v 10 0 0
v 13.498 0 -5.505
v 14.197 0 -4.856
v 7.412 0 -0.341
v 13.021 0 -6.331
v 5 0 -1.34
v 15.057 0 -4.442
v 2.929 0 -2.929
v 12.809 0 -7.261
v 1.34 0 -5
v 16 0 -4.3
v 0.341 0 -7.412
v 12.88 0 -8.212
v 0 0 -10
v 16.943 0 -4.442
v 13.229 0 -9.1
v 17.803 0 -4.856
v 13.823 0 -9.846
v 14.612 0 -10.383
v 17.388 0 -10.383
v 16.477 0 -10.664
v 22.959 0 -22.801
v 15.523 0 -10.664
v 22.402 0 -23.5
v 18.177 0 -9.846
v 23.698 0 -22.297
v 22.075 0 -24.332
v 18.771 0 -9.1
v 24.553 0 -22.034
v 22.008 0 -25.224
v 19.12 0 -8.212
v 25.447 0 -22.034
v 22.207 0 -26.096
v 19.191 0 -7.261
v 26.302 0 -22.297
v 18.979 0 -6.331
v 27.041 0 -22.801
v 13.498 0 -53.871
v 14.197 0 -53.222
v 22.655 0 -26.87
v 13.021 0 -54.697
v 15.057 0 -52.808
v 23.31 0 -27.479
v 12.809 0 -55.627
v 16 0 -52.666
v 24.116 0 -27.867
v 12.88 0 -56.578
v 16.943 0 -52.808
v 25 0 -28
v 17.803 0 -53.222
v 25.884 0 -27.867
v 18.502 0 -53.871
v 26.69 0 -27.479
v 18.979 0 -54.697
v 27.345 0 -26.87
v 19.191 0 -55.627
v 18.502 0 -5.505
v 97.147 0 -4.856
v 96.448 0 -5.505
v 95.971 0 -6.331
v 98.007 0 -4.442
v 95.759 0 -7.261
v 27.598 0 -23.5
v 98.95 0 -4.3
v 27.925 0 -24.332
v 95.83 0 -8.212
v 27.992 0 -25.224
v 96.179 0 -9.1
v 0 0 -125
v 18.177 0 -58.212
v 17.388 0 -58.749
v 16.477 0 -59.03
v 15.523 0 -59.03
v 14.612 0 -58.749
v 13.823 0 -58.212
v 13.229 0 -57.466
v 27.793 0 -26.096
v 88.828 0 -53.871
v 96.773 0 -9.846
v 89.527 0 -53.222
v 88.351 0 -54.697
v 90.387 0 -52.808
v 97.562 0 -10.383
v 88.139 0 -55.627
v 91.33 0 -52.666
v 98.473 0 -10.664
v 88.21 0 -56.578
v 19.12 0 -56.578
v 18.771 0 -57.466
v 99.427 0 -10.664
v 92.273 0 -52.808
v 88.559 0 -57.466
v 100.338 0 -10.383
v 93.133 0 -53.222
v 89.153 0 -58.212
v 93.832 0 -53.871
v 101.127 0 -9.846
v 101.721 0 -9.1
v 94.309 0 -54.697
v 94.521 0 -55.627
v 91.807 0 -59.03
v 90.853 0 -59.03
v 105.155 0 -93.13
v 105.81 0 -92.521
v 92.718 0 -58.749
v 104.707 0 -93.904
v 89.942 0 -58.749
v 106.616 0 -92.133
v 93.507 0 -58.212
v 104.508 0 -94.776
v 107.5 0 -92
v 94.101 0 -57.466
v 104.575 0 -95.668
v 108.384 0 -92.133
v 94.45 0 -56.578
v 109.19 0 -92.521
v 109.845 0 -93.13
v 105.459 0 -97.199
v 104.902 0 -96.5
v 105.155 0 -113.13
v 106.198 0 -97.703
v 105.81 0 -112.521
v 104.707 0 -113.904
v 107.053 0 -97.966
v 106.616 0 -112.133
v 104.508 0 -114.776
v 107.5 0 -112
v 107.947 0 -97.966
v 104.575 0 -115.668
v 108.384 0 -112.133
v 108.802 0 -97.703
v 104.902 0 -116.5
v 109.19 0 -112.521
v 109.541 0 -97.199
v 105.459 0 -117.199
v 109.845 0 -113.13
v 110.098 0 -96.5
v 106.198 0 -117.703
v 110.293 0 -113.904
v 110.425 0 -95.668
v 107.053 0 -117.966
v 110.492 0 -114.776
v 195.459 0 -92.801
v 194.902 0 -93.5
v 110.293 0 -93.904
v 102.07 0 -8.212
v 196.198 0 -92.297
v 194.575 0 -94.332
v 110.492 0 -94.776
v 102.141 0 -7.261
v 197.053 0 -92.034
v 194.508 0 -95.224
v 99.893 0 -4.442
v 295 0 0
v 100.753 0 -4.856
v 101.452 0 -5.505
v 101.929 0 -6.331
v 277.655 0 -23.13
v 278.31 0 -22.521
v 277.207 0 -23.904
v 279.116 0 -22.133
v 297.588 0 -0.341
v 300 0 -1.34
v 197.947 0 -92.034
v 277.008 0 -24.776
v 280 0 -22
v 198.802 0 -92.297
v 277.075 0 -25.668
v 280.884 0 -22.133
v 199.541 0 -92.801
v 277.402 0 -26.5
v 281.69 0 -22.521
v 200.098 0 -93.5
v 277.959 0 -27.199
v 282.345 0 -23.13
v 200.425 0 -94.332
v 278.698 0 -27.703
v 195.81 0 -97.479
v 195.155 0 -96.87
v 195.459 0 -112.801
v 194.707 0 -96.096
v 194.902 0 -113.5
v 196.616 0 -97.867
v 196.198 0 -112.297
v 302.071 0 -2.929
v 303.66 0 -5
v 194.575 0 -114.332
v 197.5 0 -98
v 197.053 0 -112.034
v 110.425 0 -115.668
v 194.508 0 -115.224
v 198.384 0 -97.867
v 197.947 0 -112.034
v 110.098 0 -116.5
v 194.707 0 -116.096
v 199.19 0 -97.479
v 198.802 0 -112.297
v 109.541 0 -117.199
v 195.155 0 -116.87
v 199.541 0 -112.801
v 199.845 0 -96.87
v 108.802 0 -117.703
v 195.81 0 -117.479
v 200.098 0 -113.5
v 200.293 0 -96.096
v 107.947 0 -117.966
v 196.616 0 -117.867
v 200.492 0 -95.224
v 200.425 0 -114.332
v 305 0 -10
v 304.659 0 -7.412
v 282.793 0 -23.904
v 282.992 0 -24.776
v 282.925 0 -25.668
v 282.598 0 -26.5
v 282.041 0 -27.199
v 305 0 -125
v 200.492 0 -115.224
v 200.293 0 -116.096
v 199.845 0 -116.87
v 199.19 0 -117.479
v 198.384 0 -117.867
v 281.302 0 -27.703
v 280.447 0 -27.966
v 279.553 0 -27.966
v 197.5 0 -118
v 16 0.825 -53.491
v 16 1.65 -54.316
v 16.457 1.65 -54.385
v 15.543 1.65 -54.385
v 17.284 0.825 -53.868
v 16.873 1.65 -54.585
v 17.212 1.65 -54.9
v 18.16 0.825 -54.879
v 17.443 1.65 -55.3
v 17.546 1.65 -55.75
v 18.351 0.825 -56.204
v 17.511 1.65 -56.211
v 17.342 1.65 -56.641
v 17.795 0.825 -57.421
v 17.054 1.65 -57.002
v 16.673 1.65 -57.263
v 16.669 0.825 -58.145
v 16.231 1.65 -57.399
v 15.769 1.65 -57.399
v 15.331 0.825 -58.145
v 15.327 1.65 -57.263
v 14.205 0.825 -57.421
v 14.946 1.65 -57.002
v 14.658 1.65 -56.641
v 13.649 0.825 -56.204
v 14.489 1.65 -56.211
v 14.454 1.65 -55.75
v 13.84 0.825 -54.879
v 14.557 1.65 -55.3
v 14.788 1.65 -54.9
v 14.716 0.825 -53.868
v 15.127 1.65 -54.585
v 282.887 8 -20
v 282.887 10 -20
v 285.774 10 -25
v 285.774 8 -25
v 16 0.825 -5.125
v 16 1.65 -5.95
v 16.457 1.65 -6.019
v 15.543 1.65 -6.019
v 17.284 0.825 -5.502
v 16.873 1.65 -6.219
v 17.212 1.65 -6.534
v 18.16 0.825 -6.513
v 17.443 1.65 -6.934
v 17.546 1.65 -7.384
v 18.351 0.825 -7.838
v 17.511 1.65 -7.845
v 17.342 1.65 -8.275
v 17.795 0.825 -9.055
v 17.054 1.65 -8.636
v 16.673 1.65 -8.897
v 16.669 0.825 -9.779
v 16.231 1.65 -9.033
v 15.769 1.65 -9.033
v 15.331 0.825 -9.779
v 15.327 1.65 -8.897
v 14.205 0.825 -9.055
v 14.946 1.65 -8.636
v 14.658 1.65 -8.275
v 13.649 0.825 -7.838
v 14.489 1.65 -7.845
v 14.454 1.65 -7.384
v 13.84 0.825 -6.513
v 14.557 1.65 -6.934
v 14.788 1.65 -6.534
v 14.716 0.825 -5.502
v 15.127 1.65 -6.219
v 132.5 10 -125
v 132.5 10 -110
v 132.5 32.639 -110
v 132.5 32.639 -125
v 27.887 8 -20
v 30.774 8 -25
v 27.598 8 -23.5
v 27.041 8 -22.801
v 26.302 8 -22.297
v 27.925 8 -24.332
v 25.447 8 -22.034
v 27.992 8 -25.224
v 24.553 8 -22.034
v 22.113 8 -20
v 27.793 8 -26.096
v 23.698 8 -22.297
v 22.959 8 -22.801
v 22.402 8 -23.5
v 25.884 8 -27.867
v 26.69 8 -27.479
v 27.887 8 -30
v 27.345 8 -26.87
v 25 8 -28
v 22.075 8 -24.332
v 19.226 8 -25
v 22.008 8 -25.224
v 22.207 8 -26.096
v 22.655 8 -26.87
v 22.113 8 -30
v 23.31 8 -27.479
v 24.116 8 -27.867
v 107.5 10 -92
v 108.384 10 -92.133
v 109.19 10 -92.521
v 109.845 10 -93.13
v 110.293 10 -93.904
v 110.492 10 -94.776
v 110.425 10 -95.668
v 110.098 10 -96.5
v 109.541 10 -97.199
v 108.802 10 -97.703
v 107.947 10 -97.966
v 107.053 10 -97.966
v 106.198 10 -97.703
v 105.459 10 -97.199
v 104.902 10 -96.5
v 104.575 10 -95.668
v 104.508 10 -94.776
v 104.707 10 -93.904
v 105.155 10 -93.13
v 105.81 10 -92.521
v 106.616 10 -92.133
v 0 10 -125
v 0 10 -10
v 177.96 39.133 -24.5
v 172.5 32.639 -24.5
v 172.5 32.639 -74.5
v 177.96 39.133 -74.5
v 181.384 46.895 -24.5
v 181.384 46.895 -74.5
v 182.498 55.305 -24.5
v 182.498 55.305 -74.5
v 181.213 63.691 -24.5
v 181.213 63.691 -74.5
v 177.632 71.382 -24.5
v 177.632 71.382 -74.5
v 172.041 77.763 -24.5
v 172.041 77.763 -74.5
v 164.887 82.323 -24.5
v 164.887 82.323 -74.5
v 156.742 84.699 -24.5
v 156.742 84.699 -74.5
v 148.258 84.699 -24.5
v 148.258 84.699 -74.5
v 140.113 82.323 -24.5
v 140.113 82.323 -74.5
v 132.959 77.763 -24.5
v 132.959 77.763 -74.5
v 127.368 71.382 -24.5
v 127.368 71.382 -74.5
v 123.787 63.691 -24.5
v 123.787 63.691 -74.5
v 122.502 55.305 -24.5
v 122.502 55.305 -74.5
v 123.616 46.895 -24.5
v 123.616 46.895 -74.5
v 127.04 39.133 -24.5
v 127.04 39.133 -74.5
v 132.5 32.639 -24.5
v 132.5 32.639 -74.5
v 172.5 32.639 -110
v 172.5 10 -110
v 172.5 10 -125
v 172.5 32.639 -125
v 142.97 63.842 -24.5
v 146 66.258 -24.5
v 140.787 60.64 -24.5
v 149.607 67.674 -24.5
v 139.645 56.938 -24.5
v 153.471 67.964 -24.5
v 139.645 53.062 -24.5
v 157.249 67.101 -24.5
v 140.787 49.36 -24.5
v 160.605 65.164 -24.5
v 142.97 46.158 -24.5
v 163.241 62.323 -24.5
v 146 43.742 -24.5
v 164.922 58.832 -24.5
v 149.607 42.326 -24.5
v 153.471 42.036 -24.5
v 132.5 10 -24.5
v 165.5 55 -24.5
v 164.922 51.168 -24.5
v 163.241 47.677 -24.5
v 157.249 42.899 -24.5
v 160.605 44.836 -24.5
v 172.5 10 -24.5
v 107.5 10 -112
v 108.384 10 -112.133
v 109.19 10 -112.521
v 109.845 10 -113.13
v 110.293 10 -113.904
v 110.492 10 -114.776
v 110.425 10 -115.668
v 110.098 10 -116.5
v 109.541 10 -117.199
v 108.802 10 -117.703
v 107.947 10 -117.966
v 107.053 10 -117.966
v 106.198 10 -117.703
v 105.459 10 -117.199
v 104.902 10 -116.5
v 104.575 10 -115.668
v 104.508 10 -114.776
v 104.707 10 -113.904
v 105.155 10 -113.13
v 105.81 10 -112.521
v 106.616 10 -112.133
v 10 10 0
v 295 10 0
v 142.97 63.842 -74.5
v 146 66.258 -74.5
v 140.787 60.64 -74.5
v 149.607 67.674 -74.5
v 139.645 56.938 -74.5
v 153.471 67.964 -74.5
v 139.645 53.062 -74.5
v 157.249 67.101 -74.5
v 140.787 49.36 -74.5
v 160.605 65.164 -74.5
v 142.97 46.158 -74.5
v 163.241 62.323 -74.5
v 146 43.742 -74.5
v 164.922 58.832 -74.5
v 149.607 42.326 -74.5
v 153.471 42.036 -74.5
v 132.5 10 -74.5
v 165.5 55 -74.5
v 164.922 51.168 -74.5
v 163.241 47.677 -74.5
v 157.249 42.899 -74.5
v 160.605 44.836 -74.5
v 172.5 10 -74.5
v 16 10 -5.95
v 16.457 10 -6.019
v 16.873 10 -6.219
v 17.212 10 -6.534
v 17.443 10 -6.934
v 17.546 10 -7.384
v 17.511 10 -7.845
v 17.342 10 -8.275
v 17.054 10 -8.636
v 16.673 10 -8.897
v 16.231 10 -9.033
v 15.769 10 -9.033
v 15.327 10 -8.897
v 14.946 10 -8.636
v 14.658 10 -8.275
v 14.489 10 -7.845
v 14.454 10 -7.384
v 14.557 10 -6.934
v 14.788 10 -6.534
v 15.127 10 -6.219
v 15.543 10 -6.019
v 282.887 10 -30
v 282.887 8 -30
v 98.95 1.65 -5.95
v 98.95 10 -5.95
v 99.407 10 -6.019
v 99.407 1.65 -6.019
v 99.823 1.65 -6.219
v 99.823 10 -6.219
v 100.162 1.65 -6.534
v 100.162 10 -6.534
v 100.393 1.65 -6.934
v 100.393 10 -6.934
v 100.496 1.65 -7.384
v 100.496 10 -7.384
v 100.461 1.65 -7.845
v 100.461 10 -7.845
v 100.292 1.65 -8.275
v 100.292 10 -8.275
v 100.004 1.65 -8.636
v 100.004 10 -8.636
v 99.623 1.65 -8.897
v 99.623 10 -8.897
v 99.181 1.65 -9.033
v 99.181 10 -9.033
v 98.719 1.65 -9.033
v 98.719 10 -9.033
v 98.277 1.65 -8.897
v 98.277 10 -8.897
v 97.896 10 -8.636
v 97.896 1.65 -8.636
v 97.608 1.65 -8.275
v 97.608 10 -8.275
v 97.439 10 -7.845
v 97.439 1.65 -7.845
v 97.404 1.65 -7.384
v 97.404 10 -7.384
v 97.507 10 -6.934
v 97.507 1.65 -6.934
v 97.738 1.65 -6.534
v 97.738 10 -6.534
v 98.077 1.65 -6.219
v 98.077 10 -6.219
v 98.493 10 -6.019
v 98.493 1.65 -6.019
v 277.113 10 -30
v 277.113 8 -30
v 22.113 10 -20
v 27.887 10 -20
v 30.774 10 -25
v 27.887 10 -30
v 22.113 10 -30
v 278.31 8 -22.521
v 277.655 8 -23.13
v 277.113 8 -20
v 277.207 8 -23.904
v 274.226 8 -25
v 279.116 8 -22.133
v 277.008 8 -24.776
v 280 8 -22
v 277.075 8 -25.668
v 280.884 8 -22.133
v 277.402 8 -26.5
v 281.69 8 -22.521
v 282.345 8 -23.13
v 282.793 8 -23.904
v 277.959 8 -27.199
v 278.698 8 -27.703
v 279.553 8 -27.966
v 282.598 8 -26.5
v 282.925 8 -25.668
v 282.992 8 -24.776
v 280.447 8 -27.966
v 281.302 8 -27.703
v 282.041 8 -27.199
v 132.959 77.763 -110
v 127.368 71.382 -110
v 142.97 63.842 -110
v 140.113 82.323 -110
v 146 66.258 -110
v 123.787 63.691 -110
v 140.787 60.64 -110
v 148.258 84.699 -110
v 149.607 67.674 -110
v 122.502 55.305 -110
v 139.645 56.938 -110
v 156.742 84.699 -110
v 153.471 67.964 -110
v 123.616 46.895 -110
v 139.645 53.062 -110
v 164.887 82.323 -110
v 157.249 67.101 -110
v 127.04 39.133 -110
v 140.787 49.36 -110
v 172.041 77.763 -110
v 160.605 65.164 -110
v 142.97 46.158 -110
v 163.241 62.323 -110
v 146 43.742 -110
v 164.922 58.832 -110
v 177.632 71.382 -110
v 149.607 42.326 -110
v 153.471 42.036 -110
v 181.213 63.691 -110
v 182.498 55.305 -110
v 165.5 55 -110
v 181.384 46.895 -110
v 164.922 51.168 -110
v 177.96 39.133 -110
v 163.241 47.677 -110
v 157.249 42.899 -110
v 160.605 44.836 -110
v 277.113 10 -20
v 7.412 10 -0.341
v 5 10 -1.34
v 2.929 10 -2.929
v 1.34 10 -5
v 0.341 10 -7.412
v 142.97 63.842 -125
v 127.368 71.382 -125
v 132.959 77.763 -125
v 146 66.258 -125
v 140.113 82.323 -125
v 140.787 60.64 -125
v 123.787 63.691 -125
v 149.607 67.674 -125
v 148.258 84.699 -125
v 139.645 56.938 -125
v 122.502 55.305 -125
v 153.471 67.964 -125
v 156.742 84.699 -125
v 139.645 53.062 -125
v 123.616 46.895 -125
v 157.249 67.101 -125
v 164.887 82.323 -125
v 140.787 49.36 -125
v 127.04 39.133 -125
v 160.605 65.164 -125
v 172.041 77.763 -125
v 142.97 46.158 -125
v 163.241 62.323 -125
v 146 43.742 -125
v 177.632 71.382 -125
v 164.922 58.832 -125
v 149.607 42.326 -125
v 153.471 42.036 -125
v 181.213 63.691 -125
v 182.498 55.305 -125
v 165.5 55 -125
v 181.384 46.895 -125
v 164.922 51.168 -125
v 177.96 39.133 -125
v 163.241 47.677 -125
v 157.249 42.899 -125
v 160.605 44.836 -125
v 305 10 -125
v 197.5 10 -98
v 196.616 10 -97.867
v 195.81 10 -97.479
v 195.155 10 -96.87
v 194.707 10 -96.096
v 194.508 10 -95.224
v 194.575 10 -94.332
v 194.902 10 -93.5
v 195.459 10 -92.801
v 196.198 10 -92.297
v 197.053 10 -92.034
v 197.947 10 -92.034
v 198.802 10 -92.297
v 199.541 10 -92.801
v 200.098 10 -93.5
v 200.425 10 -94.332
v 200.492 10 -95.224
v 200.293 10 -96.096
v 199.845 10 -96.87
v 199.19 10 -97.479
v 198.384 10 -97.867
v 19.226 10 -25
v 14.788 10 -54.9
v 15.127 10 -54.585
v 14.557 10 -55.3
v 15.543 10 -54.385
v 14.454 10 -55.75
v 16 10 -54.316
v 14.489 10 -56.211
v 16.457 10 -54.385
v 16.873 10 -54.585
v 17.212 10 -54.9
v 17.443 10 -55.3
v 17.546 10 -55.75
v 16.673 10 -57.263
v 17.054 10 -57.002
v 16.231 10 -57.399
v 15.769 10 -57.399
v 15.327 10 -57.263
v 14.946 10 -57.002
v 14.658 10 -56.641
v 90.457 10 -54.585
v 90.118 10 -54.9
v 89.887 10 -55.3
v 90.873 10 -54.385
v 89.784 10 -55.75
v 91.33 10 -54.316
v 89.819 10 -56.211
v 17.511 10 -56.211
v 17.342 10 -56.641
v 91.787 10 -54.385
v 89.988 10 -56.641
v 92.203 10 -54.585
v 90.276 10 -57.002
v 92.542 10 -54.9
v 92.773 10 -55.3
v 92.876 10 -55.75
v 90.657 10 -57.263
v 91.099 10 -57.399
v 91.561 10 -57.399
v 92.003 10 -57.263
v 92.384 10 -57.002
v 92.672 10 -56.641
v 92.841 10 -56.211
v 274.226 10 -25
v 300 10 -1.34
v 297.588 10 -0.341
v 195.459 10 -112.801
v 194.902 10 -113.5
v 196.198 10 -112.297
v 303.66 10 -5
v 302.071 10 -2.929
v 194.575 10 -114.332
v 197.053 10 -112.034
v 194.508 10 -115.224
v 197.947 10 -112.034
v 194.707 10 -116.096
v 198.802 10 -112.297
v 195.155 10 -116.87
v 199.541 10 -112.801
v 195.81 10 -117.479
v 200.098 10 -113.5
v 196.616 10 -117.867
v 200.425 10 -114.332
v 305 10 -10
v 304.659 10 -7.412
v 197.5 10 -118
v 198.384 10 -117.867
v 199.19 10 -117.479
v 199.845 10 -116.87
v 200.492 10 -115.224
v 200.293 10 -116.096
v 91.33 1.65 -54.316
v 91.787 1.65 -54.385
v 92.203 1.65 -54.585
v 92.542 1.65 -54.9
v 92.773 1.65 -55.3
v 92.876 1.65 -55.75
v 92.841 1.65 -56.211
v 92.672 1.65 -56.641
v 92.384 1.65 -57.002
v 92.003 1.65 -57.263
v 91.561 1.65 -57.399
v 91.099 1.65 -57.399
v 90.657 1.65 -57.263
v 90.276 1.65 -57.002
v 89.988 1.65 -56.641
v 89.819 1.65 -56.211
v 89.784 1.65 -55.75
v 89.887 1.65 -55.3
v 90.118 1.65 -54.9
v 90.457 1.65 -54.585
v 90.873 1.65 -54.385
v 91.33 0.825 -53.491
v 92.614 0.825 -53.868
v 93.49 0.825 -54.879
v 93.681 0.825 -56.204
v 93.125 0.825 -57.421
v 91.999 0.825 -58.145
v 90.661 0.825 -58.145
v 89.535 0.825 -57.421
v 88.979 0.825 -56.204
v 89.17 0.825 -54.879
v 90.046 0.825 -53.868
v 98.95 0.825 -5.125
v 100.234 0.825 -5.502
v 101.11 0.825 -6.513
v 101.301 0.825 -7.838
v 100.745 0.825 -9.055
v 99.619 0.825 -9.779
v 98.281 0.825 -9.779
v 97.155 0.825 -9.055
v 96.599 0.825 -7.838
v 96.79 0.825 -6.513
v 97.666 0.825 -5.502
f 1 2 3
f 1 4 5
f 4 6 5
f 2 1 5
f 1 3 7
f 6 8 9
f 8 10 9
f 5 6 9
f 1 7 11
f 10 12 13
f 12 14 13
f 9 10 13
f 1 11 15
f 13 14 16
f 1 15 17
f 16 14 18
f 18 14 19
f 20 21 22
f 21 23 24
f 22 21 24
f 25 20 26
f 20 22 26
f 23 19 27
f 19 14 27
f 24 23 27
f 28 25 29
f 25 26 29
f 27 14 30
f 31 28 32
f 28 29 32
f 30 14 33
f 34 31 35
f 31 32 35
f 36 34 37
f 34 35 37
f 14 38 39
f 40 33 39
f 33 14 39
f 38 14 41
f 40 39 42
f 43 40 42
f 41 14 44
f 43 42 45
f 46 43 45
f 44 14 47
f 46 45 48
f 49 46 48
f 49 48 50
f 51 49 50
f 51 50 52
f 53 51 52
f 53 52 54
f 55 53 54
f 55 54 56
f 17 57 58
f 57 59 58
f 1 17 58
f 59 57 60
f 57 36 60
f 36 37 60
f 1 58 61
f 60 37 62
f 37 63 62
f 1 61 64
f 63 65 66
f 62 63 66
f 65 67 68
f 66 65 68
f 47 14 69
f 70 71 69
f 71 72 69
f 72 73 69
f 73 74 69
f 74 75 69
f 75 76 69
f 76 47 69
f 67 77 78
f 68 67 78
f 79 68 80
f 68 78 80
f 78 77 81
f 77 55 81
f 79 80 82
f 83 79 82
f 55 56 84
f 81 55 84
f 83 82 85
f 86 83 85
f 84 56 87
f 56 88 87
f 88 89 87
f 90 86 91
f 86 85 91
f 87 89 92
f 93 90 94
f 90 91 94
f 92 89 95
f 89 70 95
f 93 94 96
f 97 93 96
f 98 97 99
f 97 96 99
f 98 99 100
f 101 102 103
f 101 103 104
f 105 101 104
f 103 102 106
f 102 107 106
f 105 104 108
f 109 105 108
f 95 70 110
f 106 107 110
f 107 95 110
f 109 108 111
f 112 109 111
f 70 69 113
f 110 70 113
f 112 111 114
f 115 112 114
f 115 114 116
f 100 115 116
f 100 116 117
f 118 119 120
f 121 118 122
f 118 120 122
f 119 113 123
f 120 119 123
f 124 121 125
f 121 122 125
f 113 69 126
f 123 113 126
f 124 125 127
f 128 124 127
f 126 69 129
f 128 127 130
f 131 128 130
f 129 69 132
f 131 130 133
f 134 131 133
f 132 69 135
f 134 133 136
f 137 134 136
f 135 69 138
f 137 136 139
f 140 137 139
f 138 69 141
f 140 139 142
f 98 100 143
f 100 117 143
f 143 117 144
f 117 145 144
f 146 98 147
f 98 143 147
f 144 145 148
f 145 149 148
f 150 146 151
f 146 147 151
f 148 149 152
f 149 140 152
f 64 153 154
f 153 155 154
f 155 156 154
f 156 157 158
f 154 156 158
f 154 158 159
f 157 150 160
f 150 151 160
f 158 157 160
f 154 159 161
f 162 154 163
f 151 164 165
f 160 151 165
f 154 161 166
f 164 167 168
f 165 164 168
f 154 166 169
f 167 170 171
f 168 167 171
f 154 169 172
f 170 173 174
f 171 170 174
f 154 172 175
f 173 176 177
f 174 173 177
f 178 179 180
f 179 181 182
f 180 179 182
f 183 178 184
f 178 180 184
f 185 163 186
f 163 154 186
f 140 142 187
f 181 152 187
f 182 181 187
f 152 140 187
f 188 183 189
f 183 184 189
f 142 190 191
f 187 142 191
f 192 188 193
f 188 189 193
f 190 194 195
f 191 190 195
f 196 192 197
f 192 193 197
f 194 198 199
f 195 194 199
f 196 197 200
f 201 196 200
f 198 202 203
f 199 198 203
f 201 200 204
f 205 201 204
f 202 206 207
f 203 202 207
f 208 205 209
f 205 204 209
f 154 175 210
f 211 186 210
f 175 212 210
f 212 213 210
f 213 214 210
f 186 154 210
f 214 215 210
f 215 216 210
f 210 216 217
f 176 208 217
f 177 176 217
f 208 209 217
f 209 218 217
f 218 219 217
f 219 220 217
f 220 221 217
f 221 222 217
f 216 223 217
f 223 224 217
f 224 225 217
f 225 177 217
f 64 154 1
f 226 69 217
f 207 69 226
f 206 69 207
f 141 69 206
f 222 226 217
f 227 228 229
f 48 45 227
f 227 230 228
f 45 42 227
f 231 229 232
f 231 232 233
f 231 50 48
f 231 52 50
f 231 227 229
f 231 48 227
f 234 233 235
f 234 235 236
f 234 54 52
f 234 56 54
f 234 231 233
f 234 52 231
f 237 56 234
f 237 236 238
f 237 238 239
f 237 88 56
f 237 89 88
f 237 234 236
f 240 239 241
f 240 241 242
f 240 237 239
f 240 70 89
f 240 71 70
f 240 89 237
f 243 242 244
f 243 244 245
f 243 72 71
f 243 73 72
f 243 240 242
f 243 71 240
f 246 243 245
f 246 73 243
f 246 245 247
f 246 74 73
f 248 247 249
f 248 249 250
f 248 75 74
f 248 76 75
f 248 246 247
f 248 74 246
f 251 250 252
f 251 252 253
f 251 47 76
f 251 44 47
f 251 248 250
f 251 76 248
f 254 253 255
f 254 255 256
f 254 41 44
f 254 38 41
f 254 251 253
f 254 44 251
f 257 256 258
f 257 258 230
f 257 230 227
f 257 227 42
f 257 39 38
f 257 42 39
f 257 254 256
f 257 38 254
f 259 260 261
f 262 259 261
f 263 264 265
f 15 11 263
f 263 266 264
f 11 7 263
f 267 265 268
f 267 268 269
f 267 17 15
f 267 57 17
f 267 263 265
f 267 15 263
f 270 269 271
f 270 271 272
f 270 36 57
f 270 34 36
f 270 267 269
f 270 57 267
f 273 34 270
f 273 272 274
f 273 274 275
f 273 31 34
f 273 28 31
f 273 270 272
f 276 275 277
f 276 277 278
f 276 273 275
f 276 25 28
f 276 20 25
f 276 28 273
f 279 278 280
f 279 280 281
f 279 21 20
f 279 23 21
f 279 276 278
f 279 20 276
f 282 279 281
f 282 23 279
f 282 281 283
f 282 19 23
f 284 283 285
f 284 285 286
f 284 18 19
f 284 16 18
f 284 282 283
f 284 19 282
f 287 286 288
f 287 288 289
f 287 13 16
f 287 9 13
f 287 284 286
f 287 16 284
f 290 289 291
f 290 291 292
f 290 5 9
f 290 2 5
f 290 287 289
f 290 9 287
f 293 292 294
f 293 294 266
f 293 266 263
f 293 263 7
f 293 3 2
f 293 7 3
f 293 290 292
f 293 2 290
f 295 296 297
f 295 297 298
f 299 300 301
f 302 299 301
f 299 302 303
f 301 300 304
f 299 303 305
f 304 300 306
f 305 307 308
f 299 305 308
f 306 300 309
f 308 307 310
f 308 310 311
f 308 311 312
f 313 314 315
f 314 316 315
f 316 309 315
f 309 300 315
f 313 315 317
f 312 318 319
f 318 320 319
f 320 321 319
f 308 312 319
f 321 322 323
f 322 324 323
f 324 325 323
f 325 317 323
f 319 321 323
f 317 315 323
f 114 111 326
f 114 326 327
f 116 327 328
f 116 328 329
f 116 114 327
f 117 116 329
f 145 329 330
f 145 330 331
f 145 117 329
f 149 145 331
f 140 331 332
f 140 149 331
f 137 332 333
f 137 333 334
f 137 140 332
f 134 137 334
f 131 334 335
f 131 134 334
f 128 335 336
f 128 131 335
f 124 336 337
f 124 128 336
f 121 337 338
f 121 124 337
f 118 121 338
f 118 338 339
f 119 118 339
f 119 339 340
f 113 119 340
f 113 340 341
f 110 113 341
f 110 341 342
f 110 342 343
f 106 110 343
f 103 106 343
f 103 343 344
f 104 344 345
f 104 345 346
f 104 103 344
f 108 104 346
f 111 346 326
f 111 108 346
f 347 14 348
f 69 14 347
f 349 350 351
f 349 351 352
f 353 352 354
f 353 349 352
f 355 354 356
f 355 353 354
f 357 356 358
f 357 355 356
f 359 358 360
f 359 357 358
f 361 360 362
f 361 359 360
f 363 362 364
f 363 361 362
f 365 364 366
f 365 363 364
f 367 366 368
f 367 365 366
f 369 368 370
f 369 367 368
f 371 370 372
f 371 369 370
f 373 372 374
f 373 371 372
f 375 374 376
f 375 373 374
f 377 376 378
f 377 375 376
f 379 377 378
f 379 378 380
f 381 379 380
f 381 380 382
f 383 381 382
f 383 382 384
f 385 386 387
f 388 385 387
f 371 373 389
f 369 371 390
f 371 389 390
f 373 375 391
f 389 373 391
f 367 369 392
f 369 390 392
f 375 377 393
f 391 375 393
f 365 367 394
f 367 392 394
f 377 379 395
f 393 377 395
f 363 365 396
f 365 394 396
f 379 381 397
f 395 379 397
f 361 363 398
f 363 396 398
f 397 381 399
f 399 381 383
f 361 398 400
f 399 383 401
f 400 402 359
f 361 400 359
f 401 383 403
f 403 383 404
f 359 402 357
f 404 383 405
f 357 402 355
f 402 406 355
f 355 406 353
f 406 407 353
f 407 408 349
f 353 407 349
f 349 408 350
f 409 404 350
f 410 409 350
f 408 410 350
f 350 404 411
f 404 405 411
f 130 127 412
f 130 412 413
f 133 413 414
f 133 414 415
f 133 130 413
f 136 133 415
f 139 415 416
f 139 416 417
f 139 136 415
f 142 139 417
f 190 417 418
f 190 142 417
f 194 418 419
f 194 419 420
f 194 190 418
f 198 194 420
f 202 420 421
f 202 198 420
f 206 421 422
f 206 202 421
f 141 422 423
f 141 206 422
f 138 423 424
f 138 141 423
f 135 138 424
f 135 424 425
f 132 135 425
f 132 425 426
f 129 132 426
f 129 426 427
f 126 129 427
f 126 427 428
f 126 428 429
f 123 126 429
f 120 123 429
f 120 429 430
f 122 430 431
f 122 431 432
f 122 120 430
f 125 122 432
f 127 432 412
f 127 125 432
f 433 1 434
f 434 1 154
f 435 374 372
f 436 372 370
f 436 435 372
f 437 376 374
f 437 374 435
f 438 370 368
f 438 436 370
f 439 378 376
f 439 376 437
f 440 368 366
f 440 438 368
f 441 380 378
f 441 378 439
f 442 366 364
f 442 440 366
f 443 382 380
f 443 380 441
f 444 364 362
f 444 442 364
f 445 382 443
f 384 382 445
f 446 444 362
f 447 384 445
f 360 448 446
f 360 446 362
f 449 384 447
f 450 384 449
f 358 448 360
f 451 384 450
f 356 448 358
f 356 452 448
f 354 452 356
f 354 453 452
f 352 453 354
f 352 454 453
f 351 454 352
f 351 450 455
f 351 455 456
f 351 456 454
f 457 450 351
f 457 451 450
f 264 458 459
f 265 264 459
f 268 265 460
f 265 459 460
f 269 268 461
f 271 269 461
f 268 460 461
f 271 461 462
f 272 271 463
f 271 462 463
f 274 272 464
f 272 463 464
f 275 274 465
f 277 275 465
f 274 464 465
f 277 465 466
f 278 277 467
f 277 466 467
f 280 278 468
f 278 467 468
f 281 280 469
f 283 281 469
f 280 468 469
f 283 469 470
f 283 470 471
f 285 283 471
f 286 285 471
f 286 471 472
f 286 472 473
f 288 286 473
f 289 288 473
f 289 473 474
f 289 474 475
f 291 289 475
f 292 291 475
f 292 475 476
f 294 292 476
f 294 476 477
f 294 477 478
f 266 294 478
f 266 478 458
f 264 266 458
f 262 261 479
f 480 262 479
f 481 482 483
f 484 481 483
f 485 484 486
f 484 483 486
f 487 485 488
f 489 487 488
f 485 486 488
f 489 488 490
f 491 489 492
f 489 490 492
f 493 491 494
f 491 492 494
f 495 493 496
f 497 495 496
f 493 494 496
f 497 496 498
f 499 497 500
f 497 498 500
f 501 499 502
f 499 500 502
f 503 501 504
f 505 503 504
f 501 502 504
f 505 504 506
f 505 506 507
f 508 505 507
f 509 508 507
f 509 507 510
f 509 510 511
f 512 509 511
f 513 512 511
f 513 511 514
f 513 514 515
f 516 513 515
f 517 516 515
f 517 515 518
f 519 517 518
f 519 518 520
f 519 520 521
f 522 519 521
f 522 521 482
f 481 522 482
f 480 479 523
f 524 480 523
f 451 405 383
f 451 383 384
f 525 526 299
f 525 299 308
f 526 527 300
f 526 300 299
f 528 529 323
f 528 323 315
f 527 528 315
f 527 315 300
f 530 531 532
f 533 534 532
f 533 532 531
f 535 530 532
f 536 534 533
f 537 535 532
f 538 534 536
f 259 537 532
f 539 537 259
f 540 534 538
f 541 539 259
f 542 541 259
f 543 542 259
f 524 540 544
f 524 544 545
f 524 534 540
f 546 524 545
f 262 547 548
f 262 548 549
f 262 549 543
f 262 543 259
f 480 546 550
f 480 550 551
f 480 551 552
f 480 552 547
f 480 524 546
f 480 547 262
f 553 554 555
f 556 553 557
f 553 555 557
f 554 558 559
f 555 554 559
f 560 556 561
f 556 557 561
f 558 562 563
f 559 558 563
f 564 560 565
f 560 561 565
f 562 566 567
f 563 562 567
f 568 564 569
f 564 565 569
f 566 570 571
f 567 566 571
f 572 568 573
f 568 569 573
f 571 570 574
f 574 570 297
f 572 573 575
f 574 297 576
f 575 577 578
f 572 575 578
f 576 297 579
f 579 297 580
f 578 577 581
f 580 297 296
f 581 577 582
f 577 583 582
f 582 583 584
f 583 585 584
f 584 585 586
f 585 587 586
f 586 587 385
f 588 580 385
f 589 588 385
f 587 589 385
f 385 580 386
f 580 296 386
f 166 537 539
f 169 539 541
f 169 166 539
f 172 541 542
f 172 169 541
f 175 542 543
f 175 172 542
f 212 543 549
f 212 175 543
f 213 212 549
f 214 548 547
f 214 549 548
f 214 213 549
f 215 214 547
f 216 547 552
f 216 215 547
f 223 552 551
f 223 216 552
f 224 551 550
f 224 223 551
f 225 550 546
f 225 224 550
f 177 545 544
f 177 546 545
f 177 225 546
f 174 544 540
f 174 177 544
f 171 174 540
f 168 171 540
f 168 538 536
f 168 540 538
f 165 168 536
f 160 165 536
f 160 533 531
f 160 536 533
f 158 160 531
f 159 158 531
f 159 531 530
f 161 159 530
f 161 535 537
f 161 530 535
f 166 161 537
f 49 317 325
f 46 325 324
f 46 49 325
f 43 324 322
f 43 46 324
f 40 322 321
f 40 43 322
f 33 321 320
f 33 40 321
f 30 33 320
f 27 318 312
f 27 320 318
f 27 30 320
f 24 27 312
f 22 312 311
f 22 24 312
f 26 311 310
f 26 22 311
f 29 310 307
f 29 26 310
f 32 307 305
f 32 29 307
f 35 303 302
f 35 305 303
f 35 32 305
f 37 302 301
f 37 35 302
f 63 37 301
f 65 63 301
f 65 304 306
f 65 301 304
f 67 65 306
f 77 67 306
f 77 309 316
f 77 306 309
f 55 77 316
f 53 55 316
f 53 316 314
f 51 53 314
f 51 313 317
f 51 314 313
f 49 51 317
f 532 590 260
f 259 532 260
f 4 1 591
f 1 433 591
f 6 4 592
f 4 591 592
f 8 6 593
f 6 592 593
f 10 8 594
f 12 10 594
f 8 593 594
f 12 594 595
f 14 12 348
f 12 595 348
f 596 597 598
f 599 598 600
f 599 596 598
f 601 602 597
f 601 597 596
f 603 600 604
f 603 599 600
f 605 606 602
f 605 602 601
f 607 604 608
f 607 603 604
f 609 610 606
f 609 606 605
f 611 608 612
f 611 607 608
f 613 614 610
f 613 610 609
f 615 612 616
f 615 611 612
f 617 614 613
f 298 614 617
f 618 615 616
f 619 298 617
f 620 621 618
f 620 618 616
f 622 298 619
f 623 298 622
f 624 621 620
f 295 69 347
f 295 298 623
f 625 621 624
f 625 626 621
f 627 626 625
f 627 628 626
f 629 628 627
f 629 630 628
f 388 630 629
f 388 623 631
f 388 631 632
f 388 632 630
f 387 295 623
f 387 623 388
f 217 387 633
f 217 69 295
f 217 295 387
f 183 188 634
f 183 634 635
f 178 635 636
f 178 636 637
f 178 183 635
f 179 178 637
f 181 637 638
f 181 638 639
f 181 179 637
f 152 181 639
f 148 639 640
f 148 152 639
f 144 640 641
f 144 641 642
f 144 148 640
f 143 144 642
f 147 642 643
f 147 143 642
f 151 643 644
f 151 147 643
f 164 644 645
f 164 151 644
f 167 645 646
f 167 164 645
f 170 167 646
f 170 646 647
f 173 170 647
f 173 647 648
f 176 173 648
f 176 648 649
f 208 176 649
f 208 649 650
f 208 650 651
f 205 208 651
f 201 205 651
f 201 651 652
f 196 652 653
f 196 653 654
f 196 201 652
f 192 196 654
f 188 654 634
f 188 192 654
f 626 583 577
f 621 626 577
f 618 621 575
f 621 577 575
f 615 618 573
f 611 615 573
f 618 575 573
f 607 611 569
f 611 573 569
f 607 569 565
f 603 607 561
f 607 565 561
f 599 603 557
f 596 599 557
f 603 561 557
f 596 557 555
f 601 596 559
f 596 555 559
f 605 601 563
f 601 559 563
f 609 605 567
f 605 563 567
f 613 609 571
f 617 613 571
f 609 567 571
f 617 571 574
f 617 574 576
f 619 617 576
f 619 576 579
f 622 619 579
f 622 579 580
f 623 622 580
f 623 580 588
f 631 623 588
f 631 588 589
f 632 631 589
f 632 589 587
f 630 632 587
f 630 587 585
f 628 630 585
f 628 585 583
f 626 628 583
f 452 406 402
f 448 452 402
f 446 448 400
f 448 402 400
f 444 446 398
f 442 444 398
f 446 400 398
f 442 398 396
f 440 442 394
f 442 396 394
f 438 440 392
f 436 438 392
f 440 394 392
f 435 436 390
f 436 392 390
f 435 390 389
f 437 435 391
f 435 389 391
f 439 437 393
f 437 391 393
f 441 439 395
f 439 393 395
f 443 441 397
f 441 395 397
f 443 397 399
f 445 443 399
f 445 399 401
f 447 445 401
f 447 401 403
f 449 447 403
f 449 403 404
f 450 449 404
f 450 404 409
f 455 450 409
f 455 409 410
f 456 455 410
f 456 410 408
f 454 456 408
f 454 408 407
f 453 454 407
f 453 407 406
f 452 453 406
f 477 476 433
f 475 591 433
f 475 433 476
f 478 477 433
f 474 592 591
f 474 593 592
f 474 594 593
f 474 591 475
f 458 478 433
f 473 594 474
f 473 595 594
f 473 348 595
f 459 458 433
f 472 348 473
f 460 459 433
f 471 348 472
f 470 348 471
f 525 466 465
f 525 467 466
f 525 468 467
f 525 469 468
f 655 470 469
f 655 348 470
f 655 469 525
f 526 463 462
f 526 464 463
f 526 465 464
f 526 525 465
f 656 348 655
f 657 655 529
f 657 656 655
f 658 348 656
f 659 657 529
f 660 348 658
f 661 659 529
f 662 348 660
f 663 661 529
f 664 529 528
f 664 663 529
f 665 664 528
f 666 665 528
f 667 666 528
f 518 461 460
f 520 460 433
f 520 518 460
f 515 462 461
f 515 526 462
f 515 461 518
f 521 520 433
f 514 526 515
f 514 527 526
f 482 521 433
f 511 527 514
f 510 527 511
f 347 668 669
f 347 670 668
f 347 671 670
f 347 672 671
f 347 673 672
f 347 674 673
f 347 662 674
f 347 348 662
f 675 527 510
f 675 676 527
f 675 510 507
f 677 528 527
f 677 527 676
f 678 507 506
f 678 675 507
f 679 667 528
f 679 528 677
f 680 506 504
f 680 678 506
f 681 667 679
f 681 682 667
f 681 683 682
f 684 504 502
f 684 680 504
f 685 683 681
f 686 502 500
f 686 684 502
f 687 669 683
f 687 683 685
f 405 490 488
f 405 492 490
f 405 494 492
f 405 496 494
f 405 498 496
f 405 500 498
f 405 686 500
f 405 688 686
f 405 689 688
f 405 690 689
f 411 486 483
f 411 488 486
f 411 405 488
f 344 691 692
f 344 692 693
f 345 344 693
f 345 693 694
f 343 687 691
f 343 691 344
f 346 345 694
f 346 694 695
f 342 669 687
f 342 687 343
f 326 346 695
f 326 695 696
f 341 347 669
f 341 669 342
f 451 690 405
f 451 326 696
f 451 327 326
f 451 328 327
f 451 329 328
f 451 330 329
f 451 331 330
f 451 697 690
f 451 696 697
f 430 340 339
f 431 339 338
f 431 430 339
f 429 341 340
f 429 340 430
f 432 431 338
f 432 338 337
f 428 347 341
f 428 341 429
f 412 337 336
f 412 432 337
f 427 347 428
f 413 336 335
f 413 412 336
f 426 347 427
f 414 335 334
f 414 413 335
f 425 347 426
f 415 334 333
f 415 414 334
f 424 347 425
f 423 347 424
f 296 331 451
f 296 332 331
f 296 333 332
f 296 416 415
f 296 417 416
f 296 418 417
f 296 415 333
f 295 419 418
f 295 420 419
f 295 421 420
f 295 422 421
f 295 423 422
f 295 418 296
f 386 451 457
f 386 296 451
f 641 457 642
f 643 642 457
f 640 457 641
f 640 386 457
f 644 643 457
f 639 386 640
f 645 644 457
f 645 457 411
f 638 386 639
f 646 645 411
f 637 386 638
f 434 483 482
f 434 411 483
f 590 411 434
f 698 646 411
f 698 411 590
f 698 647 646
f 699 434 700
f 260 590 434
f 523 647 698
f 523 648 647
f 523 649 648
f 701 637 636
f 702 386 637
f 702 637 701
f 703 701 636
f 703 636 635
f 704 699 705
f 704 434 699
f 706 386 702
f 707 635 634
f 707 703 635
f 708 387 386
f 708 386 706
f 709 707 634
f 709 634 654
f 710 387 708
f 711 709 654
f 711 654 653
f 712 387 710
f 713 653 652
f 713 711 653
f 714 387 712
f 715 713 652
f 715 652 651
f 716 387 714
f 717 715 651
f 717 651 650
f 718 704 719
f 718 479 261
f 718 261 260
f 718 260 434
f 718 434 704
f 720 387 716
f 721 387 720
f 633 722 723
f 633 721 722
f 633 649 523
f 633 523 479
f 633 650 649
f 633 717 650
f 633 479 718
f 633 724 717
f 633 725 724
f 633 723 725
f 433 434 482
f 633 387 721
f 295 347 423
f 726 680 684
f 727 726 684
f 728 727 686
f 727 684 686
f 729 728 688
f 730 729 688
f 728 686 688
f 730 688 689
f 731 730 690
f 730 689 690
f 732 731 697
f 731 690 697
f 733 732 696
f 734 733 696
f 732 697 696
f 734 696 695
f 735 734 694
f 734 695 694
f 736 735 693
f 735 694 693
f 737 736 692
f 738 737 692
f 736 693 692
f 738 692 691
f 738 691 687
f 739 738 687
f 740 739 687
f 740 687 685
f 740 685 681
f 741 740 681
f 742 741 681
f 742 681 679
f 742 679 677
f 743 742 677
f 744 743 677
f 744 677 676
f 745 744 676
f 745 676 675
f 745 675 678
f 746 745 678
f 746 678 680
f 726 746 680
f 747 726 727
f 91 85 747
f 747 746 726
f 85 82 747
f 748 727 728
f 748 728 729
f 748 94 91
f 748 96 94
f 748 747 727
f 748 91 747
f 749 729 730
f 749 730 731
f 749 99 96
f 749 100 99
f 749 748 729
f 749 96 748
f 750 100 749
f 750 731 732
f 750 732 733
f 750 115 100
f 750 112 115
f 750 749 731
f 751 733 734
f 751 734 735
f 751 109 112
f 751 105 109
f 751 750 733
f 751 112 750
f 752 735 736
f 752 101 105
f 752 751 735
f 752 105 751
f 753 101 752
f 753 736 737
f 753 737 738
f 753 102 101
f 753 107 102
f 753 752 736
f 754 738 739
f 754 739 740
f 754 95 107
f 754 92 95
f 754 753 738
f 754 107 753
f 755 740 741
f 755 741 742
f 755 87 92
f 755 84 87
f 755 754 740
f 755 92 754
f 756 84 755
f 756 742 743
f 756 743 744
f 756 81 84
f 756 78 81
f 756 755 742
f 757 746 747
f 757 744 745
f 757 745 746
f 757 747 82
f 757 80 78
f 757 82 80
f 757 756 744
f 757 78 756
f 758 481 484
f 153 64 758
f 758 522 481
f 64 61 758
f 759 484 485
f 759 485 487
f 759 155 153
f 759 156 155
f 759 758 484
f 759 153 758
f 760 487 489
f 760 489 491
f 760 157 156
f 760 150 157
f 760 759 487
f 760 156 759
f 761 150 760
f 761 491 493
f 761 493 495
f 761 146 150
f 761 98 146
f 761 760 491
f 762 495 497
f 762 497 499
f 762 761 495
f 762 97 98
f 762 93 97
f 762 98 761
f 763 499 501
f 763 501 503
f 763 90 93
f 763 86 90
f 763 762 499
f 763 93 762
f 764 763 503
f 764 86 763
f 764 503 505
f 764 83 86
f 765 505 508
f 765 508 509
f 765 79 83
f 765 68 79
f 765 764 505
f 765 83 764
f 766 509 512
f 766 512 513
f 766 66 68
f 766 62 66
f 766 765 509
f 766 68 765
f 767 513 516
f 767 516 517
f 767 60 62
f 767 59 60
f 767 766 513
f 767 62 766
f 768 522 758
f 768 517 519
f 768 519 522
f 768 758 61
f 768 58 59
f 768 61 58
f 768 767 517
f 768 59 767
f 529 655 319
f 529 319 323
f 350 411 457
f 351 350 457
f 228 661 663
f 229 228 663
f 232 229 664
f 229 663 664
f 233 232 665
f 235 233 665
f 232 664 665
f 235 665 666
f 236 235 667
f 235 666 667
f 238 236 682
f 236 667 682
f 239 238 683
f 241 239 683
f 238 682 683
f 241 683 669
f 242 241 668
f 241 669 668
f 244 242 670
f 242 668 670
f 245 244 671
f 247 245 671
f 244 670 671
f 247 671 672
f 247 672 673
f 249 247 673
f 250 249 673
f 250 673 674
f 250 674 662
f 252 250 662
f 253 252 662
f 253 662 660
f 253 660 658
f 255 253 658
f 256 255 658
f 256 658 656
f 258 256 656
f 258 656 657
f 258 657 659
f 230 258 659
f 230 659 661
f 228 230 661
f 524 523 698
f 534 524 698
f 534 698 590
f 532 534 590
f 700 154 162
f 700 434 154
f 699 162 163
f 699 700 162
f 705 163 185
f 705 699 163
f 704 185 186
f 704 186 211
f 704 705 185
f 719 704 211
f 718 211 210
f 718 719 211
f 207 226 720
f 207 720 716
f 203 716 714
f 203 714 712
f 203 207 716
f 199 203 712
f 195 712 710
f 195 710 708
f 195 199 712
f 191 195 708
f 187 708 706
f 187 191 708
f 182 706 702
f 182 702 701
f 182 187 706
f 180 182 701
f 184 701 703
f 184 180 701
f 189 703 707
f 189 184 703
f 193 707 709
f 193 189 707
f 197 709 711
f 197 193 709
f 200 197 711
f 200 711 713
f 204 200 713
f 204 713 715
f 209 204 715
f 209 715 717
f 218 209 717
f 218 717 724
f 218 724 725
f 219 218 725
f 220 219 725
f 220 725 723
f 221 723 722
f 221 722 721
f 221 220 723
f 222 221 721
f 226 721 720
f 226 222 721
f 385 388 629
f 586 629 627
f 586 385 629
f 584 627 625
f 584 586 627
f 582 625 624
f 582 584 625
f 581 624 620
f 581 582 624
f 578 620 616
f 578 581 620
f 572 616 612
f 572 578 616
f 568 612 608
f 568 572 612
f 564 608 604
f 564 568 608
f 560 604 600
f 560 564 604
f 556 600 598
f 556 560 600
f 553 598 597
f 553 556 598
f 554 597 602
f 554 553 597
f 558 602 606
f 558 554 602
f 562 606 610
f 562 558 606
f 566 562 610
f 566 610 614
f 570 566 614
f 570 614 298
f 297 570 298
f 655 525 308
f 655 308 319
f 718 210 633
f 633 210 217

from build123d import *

# Parameters (mm, degrees)
SKETCH1_W           = 305
SKETCH1_H           = 125
SKETCH1_R           = 3
BOSS_EXTRUDE1_DEPTH = 10
SKETCH7_W           = 40
SKETCH7_H           = 50
SKETCH7_H_2         = 15
BOSS_EXTRUDE2_DEPTH = 22.639320225
BOSS_EXTRUDE3_REACH = 324.786
SKETCH11_R          = 30
SKETCH11_R_2        = 13
SKETCH12_W          = 35.5
SKETCH12_H          = 75
CUT_EXTRUDE2_DEPTH  = 341.404171537
CUT_EXTRUDE1_DEPTH  = 2
SKETCH16_R          = 1.55
CUT_EXTRUDE3_DEPTH  = 339.045854878
FILLET3_R           = 10
CHAMFER2_SIZE       = 1.65


with BuildPart() as part:
    # Sketch1 → Boss-Extrude1 (new body)
    with BuildSketch(Plane(origin=(0, 0, 0), x_dir=(1, 0, 0), z_dir=(0, 1, 0))):
        with Locations((152.5, 62.5)):
            Rectangle(SKETCH1_W, SKETCH1_H)
        with Locations(Location((280, 25, 0), (0, 0, 270))):
            Circle(SKETCH1_R, mode=Mode.SUBTRACT)
        with Locations(Location((25, 25, 0), (0, 0, 90))):
            Circle(SKETCH1_R, mode=Mode.SUBTRACT)
        with Locations(Location((107.5, 115, 0), (0, 0, 270))):
            Circle(SKETCH1_R, mode=Mode.SUBTRACT)
        with Locations(Location((107.5, 95, 0), (0, 0, 270))):
            Circle(SKETCH1_R, mode=Mode.SUBTRACT)
        with Locations(Location((197.5, 115, 0), (0, 0, 90))):
            Circle(SKETCH1_R, mode=Mode.SUBTRACT)
        with Locations(Location((197.5, 95, 0), (0, 0, 90))):
            Circle(SKETCH1_R, mode=Mode.SUBTRACT)
    extrude(amount=BOSS_EXTRUDE1_DEPTH)

    # Sketch7 → Boss-Extrude2 (add)
    with BuildSketch(Plane(origin=(0, 10, 0), x_dir=(1, 0, 0), z_dir=(0, 1, 0))):
        with Locations((152.5, 49.5)):
            Rectangle(SKETCH7_W, SKETCH7_H)
        with Locations((152.5, 117.5)):
            Rectangle(SKETCH7_W, SKETCH7_H_2)
    extrude(amount=BOSS_EXTRUDE2_DEPTH)

    # Boss-Extrude3: up to this face of the body (flat: up to its plane)
    boss_extrude3_end = Plane(part.part.faces().sort_by_distance((152.5, 8.736156851, -125))[0])
    # Sketch11 → Boss-Extrude3 (add, up to the picked face)
    with BuildSketch(Plane.XY.offset(-24.5), mode=Mode.PRIVATE) as boss_extrude3_sk1:
        with Locations(Location((152.5, 55, 0), (0, 0, 311.810314896))):
            Circle(SKETCH11_R)
        with Locations((152.5, 55)):
            Circle(SKETCH11_R_2, mode=Mode.SUBTRACT)
    boss_extrude3_tool1 = split(extrude(boss_extrude3_sk1.sketch, amount=-BOSS_EXTRUDE3_REACH, mode=Mode.PRIVATE), bisect_by=boss_extrude3_end, keep=Keep.BOTH, mode=Mode.PRIVATE)
    add(boss_extrude3_tool1.solids().sort_by(Axis((133.065685, 76.728224, -24.5), (0, 0, -1)))[0])

    # Sketch12 → Cut-Extrude2 (cut, through all)
    with BuildSketch(Plane(origin=(305, 0, 0), x_dir=(0, 0, -1), z_dir=(1, 0, 0))):
        with Locations((92.25, 47.5)):
            Rectangle(SKETCH12_W, SKETCH12_H)
    extrude(amount=-CUT_EXTRUDE2_DEPTH, mode=Mode.SUBTRACT)

    # Sketch6 → Cut-Extrude1 (cut)
    with BuildSketch(Plane(origin=(0, 10, 0), x_dir=(1, 0, 0), z_dir=(0, 1, 0))):
        Polygon((27.886751346, 30), (30.773502692, 25), (27.886751346, 20), (22.113248654, 20), (19.226497308, 25), (22.113248654, 30), align=None)
        Polygon((274.226497308, 25), (277.113248654, 20), (282.886751346, 20), (285.773502692, 25), (282.886751346, 30), (277.113248654, 30), align=None)
    extrude(amount=-CUT_EXTRUDE1_DEPTH, mode=Mode.SUBTRACT)

    # Sketch16 → Cut-Extrude3 (cut, through all)
    with BuildSketch(Plane(origin=(0, 10, 0), x_dir=(1, 0, 0), z_dir=(0, 1, 0))):
        with Locations(Location((16, 7.5, 0), (0, 0, 270))):
            Circle(SKETCH16_R)
        with Locations(Location((98.95, 7.5, 0), (0, 0, 270))):
            Circle(SKETCH16_R)
        with Locations(Location((16, 55.866, 0), (0, 0, 270))):
            Circle(SKETCH16_R)
        with Locations(Location((91.33, 55.866, 0), (0, 0, 270))):
            Circle(SKETCH16_R)
    extrude(amount=-CUT_EXTRUDE3_DEPTH, mode=Mode.SUBTRACT)

    # Fillet3
    fillet3_edges = [part.edges().sort_by_distance(p)[0] for p in [
        (305, 5, 0),
        (0, 5, 0),
    ]]
    fillet(fillet3_edges, radius=FILLET3_R)

    # Chamfer2
    chamfer2_edges = [part.edges().sort_by_distance(p)[0] for p in [
        (98.95, 0, -9.05),
        (16, 0, -57.416),
        (91.33, 0, -57.416),
        (16, 0, -9.05),
    ]]
    chamfer(chamfer2_edges, length=CHAMFER2_SIZE)


solid = part.part
